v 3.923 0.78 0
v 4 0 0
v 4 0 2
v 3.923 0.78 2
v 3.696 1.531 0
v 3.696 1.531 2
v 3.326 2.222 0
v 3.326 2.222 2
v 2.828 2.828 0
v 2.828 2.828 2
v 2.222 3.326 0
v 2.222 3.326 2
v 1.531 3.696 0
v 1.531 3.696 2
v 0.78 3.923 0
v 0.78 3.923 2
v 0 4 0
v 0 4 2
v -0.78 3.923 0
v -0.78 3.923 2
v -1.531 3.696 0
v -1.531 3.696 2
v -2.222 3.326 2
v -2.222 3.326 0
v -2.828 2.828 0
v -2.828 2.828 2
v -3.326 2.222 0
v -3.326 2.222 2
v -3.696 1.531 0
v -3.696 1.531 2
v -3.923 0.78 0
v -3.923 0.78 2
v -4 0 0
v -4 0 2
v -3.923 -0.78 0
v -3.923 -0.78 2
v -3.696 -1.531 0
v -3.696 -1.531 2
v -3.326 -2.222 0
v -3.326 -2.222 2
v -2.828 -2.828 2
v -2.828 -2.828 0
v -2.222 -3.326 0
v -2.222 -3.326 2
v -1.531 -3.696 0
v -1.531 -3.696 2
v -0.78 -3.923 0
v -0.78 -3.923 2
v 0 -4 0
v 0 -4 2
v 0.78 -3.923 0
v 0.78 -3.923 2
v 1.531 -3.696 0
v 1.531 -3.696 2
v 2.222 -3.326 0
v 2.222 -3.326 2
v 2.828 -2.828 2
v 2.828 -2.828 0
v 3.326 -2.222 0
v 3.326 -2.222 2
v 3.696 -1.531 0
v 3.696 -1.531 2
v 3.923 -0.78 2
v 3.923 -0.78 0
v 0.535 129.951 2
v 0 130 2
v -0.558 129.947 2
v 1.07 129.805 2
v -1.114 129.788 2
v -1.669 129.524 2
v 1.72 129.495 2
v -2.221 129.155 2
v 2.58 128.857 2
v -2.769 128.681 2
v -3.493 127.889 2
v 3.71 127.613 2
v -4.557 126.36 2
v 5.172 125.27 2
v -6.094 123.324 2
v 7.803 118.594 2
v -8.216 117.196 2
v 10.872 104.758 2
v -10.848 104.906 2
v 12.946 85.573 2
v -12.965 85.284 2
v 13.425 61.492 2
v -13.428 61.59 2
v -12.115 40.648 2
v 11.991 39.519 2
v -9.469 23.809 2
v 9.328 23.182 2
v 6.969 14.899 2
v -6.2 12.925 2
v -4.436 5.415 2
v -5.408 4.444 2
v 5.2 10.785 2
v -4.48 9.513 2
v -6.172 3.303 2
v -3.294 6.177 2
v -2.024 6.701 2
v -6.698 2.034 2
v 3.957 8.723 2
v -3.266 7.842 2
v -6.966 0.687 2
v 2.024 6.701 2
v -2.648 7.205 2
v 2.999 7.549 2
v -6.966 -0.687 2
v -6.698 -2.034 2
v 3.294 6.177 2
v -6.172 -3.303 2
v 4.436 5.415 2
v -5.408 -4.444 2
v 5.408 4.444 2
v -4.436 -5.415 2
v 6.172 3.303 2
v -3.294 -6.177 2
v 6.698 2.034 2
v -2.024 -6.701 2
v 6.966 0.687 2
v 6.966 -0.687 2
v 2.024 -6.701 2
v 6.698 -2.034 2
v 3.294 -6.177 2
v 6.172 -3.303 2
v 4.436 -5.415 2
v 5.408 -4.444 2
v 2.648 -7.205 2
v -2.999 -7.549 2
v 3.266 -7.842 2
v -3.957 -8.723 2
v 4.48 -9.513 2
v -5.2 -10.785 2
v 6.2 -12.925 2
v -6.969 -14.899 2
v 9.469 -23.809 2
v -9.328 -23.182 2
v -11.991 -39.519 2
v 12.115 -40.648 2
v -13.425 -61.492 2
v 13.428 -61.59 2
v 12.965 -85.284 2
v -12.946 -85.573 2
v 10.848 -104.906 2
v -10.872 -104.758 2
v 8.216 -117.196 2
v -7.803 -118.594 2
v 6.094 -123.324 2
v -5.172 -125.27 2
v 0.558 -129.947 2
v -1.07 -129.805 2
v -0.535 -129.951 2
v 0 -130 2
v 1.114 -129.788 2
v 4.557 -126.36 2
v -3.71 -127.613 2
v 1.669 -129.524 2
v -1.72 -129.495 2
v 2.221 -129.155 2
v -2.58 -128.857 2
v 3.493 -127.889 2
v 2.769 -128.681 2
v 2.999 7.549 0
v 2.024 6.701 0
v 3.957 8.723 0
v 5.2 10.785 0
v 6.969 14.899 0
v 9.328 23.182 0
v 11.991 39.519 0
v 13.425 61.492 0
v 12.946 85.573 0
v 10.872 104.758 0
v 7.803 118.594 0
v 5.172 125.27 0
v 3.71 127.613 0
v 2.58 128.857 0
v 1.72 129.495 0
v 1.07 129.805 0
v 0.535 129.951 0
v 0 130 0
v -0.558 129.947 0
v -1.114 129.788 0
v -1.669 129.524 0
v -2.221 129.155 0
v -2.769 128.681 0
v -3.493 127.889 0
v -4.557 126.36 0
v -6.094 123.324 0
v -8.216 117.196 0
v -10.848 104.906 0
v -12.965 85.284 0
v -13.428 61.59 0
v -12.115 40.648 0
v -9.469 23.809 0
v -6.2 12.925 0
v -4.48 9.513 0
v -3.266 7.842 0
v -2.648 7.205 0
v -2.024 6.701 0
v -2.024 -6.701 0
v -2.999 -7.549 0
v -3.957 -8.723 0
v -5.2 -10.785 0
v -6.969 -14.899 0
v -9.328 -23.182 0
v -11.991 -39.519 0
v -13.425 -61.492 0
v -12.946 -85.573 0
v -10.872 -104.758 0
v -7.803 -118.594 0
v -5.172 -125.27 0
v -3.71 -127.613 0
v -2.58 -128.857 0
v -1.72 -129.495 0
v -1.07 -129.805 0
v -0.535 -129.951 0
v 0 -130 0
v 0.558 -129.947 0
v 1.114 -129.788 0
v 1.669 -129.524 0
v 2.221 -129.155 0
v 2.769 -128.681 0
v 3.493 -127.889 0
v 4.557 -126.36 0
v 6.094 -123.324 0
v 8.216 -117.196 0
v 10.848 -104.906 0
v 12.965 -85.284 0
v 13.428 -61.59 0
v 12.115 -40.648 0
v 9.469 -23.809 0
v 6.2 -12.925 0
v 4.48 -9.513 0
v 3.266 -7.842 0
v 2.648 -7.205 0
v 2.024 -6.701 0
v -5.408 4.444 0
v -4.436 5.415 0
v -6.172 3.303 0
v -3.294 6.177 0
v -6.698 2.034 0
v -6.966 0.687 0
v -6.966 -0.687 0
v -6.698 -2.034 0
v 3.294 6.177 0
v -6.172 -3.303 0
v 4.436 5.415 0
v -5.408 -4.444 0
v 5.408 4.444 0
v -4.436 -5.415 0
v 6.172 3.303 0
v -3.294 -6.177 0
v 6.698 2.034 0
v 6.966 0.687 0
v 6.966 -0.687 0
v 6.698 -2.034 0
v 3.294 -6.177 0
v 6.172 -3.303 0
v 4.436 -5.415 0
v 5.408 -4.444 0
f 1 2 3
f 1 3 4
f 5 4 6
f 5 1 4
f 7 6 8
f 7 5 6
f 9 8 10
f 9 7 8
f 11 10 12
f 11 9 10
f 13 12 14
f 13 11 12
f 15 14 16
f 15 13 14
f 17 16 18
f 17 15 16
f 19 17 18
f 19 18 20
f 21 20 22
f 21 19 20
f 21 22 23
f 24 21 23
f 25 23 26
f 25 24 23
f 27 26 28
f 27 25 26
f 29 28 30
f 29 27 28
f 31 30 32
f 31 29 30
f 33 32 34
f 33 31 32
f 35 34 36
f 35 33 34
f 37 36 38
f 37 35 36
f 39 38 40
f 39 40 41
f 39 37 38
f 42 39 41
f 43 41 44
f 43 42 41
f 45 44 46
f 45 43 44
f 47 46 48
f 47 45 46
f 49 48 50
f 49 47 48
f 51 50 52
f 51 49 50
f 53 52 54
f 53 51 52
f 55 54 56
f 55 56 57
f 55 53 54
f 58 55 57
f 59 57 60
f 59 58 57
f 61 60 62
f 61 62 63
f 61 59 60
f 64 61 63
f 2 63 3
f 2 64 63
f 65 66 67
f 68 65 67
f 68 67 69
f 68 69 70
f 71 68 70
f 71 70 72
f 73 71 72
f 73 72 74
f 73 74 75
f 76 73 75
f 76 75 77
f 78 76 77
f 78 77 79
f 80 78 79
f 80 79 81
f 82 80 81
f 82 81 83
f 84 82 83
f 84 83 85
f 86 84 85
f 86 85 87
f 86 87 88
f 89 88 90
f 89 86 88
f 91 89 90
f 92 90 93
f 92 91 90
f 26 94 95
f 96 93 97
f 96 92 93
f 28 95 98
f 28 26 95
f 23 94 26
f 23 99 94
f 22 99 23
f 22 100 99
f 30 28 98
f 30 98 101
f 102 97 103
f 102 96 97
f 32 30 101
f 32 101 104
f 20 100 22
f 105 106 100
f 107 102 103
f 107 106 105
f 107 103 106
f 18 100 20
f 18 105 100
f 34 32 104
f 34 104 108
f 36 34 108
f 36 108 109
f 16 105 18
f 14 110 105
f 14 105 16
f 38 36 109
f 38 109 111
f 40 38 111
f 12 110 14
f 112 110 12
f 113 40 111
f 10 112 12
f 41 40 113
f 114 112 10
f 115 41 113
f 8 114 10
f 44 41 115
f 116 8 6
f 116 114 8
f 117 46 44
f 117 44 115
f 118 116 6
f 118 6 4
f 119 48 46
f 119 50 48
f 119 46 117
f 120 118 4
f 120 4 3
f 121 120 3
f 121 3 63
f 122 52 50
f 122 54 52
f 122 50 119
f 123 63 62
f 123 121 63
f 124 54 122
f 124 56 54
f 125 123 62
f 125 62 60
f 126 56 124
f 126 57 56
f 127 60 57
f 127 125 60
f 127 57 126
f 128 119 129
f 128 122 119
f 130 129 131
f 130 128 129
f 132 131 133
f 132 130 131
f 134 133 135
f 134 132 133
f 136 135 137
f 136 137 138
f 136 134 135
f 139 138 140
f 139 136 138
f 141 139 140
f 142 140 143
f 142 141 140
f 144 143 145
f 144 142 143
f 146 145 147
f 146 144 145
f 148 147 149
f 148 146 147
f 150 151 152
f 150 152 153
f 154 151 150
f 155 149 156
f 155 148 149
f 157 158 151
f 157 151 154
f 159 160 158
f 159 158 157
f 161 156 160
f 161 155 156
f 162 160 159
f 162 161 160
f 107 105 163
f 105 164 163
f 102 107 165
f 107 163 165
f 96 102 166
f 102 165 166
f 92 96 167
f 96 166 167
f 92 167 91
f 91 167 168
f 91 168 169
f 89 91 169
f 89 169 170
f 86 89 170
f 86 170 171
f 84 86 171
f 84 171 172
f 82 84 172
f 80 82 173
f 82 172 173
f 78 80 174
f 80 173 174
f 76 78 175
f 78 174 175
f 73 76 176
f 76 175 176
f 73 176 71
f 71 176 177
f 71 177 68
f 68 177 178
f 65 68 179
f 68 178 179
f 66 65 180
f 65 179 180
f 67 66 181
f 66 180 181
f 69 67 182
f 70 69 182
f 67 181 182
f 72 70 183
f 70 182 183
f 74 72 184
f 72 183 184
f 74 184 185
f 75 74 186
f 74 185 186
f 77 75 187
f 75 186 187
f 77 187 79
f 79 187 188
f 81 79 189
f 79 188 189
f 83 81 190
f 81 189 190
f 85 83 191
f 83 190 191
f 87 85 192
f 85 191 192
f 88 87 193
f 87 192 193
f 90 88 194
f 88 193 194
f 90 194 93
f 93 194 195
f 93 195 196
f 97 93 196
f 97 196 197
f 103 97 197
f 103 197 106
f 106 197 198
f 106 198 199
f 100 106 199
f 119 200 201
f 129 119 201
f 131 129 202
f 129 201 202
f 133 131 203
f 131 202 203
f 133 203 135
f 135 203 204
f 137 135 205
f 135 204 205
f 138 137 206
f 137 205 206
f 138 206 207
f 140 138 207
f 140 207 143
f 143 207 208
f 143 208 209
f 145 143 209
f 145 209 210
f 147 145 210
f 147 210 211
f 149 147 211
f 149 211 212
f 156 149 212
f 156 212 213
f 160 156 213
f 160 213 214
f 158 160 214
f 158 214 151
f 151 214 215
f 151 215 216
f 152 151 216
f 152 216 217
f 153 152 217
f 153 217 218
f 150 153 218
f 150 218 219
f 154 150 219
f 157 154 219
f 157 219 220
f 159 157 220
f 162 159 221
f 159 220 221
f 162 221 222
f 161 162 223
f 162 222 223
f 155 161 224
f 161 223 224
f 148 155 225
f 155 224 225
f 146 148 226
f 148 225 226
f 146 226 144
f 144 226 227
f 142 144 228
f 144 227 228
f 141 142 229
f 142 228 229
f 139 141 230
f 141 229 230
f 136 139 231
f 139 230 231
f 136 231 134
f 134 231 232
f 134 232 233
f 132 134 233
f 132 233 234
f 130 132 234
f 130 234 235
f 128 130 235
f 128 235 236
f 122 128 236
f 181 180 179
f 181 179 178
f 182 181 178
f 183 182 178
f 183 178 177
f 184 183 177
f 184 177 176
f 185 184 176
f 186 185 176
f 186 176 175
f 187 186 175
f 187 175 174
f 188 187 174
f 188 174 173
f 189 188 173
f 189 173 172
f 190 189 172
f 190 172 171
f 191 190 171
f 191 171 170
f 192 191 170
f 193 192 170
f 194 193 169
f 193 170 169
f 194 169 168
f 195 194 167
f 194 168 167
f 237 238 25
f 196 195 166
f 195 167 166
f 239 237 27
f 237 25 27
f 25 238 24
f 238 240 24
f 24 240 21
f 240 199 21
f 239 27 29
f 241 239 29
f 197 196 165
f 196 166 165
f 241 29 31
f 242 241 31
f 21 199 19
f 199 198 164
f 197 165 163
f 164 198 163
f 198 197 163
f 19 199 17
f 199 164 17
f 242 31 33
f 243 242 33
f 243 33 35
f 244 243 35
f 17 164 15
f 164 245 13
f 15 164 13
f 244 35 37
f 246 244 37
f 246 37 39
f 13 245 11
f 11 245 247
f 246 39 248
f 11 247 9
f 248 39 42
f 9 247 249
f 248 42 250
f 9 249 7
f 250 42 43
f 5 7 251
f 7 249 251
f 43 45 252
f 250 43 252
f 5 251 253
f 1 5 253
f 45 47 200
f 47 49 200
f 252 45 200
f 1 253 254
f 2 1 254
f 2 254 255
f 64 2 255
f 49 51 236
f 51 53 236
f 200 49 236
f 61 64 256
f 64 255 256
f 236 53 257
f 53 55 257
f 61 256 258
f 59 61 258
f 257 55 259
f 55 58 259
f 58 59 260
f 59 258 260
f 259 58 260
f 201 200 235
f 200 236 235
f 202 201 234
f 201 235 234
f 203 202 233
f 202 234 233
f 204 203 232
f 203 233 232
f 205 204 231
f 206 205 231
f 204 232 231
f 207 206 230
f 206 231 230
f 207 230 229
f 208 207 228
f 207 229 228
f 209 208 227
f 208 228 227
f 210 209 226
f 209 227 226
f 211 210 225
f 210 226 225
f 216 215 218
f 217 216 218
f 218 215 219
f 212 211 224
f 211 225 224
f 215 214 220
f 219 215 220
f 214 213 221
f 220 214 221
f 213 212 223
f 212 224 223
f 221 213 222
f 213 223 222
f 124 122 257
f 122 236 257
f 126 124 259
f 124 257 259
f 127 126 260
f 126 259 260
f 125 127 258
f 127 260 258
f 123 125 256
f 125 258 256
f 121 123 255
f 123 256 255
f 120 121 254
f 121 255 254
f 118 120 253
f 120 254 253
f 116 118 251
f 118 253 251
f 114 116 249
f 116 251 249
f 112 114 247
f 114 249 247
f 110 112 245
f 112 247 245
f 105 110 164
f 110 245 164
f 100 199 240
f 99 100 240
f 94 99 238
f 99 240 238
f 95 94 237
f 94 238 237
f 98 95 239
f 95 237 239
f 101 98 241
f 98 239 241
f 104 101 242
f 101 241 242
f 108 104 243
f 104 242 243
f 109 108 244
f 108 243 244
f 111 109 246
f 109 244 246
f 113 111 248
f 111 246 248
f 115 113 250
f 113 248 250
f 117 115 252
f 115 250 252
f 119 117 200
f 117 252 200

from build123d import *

# Parameters (mm, degrees)
SKETCH1_R           = 7
SKETCH1_R_2         = 4
SKETCH1_RX          = 62
SKETCH1_RY          = 13.5
BOSS_EXTRUDE3_DEPTH = 2


with BuildPart() as part:
    # Sketch1 → Boss-Extrude3 (new body)
    # profile 1 of 3: a face of its own
    with BuildSketch(Plane.XY):
        Circle(SKETCH1_R)
        Circle(SKETCH1_R_2, mode=Mode.SUBTRACT)
    # profile 2 of 3: a face of its own
    with BuildSketch(Plane.XY):
        with Locations(Location((0, 68), (0, 0, 90))):
            Ellipse(SKETCH1_RX, SKETCH1_RY)
    # profile 3 of 3: a face of its own
    with BuildSketch(Plane.XY):
        with Locations(Location((0, -68), (0, 0, -90))):
            Ellipse(SKETCH1_RX, SKETCH1_RY)
    extrude(amount=BOSS_EXTRUDE3_DEPTH)


solid = part.part
